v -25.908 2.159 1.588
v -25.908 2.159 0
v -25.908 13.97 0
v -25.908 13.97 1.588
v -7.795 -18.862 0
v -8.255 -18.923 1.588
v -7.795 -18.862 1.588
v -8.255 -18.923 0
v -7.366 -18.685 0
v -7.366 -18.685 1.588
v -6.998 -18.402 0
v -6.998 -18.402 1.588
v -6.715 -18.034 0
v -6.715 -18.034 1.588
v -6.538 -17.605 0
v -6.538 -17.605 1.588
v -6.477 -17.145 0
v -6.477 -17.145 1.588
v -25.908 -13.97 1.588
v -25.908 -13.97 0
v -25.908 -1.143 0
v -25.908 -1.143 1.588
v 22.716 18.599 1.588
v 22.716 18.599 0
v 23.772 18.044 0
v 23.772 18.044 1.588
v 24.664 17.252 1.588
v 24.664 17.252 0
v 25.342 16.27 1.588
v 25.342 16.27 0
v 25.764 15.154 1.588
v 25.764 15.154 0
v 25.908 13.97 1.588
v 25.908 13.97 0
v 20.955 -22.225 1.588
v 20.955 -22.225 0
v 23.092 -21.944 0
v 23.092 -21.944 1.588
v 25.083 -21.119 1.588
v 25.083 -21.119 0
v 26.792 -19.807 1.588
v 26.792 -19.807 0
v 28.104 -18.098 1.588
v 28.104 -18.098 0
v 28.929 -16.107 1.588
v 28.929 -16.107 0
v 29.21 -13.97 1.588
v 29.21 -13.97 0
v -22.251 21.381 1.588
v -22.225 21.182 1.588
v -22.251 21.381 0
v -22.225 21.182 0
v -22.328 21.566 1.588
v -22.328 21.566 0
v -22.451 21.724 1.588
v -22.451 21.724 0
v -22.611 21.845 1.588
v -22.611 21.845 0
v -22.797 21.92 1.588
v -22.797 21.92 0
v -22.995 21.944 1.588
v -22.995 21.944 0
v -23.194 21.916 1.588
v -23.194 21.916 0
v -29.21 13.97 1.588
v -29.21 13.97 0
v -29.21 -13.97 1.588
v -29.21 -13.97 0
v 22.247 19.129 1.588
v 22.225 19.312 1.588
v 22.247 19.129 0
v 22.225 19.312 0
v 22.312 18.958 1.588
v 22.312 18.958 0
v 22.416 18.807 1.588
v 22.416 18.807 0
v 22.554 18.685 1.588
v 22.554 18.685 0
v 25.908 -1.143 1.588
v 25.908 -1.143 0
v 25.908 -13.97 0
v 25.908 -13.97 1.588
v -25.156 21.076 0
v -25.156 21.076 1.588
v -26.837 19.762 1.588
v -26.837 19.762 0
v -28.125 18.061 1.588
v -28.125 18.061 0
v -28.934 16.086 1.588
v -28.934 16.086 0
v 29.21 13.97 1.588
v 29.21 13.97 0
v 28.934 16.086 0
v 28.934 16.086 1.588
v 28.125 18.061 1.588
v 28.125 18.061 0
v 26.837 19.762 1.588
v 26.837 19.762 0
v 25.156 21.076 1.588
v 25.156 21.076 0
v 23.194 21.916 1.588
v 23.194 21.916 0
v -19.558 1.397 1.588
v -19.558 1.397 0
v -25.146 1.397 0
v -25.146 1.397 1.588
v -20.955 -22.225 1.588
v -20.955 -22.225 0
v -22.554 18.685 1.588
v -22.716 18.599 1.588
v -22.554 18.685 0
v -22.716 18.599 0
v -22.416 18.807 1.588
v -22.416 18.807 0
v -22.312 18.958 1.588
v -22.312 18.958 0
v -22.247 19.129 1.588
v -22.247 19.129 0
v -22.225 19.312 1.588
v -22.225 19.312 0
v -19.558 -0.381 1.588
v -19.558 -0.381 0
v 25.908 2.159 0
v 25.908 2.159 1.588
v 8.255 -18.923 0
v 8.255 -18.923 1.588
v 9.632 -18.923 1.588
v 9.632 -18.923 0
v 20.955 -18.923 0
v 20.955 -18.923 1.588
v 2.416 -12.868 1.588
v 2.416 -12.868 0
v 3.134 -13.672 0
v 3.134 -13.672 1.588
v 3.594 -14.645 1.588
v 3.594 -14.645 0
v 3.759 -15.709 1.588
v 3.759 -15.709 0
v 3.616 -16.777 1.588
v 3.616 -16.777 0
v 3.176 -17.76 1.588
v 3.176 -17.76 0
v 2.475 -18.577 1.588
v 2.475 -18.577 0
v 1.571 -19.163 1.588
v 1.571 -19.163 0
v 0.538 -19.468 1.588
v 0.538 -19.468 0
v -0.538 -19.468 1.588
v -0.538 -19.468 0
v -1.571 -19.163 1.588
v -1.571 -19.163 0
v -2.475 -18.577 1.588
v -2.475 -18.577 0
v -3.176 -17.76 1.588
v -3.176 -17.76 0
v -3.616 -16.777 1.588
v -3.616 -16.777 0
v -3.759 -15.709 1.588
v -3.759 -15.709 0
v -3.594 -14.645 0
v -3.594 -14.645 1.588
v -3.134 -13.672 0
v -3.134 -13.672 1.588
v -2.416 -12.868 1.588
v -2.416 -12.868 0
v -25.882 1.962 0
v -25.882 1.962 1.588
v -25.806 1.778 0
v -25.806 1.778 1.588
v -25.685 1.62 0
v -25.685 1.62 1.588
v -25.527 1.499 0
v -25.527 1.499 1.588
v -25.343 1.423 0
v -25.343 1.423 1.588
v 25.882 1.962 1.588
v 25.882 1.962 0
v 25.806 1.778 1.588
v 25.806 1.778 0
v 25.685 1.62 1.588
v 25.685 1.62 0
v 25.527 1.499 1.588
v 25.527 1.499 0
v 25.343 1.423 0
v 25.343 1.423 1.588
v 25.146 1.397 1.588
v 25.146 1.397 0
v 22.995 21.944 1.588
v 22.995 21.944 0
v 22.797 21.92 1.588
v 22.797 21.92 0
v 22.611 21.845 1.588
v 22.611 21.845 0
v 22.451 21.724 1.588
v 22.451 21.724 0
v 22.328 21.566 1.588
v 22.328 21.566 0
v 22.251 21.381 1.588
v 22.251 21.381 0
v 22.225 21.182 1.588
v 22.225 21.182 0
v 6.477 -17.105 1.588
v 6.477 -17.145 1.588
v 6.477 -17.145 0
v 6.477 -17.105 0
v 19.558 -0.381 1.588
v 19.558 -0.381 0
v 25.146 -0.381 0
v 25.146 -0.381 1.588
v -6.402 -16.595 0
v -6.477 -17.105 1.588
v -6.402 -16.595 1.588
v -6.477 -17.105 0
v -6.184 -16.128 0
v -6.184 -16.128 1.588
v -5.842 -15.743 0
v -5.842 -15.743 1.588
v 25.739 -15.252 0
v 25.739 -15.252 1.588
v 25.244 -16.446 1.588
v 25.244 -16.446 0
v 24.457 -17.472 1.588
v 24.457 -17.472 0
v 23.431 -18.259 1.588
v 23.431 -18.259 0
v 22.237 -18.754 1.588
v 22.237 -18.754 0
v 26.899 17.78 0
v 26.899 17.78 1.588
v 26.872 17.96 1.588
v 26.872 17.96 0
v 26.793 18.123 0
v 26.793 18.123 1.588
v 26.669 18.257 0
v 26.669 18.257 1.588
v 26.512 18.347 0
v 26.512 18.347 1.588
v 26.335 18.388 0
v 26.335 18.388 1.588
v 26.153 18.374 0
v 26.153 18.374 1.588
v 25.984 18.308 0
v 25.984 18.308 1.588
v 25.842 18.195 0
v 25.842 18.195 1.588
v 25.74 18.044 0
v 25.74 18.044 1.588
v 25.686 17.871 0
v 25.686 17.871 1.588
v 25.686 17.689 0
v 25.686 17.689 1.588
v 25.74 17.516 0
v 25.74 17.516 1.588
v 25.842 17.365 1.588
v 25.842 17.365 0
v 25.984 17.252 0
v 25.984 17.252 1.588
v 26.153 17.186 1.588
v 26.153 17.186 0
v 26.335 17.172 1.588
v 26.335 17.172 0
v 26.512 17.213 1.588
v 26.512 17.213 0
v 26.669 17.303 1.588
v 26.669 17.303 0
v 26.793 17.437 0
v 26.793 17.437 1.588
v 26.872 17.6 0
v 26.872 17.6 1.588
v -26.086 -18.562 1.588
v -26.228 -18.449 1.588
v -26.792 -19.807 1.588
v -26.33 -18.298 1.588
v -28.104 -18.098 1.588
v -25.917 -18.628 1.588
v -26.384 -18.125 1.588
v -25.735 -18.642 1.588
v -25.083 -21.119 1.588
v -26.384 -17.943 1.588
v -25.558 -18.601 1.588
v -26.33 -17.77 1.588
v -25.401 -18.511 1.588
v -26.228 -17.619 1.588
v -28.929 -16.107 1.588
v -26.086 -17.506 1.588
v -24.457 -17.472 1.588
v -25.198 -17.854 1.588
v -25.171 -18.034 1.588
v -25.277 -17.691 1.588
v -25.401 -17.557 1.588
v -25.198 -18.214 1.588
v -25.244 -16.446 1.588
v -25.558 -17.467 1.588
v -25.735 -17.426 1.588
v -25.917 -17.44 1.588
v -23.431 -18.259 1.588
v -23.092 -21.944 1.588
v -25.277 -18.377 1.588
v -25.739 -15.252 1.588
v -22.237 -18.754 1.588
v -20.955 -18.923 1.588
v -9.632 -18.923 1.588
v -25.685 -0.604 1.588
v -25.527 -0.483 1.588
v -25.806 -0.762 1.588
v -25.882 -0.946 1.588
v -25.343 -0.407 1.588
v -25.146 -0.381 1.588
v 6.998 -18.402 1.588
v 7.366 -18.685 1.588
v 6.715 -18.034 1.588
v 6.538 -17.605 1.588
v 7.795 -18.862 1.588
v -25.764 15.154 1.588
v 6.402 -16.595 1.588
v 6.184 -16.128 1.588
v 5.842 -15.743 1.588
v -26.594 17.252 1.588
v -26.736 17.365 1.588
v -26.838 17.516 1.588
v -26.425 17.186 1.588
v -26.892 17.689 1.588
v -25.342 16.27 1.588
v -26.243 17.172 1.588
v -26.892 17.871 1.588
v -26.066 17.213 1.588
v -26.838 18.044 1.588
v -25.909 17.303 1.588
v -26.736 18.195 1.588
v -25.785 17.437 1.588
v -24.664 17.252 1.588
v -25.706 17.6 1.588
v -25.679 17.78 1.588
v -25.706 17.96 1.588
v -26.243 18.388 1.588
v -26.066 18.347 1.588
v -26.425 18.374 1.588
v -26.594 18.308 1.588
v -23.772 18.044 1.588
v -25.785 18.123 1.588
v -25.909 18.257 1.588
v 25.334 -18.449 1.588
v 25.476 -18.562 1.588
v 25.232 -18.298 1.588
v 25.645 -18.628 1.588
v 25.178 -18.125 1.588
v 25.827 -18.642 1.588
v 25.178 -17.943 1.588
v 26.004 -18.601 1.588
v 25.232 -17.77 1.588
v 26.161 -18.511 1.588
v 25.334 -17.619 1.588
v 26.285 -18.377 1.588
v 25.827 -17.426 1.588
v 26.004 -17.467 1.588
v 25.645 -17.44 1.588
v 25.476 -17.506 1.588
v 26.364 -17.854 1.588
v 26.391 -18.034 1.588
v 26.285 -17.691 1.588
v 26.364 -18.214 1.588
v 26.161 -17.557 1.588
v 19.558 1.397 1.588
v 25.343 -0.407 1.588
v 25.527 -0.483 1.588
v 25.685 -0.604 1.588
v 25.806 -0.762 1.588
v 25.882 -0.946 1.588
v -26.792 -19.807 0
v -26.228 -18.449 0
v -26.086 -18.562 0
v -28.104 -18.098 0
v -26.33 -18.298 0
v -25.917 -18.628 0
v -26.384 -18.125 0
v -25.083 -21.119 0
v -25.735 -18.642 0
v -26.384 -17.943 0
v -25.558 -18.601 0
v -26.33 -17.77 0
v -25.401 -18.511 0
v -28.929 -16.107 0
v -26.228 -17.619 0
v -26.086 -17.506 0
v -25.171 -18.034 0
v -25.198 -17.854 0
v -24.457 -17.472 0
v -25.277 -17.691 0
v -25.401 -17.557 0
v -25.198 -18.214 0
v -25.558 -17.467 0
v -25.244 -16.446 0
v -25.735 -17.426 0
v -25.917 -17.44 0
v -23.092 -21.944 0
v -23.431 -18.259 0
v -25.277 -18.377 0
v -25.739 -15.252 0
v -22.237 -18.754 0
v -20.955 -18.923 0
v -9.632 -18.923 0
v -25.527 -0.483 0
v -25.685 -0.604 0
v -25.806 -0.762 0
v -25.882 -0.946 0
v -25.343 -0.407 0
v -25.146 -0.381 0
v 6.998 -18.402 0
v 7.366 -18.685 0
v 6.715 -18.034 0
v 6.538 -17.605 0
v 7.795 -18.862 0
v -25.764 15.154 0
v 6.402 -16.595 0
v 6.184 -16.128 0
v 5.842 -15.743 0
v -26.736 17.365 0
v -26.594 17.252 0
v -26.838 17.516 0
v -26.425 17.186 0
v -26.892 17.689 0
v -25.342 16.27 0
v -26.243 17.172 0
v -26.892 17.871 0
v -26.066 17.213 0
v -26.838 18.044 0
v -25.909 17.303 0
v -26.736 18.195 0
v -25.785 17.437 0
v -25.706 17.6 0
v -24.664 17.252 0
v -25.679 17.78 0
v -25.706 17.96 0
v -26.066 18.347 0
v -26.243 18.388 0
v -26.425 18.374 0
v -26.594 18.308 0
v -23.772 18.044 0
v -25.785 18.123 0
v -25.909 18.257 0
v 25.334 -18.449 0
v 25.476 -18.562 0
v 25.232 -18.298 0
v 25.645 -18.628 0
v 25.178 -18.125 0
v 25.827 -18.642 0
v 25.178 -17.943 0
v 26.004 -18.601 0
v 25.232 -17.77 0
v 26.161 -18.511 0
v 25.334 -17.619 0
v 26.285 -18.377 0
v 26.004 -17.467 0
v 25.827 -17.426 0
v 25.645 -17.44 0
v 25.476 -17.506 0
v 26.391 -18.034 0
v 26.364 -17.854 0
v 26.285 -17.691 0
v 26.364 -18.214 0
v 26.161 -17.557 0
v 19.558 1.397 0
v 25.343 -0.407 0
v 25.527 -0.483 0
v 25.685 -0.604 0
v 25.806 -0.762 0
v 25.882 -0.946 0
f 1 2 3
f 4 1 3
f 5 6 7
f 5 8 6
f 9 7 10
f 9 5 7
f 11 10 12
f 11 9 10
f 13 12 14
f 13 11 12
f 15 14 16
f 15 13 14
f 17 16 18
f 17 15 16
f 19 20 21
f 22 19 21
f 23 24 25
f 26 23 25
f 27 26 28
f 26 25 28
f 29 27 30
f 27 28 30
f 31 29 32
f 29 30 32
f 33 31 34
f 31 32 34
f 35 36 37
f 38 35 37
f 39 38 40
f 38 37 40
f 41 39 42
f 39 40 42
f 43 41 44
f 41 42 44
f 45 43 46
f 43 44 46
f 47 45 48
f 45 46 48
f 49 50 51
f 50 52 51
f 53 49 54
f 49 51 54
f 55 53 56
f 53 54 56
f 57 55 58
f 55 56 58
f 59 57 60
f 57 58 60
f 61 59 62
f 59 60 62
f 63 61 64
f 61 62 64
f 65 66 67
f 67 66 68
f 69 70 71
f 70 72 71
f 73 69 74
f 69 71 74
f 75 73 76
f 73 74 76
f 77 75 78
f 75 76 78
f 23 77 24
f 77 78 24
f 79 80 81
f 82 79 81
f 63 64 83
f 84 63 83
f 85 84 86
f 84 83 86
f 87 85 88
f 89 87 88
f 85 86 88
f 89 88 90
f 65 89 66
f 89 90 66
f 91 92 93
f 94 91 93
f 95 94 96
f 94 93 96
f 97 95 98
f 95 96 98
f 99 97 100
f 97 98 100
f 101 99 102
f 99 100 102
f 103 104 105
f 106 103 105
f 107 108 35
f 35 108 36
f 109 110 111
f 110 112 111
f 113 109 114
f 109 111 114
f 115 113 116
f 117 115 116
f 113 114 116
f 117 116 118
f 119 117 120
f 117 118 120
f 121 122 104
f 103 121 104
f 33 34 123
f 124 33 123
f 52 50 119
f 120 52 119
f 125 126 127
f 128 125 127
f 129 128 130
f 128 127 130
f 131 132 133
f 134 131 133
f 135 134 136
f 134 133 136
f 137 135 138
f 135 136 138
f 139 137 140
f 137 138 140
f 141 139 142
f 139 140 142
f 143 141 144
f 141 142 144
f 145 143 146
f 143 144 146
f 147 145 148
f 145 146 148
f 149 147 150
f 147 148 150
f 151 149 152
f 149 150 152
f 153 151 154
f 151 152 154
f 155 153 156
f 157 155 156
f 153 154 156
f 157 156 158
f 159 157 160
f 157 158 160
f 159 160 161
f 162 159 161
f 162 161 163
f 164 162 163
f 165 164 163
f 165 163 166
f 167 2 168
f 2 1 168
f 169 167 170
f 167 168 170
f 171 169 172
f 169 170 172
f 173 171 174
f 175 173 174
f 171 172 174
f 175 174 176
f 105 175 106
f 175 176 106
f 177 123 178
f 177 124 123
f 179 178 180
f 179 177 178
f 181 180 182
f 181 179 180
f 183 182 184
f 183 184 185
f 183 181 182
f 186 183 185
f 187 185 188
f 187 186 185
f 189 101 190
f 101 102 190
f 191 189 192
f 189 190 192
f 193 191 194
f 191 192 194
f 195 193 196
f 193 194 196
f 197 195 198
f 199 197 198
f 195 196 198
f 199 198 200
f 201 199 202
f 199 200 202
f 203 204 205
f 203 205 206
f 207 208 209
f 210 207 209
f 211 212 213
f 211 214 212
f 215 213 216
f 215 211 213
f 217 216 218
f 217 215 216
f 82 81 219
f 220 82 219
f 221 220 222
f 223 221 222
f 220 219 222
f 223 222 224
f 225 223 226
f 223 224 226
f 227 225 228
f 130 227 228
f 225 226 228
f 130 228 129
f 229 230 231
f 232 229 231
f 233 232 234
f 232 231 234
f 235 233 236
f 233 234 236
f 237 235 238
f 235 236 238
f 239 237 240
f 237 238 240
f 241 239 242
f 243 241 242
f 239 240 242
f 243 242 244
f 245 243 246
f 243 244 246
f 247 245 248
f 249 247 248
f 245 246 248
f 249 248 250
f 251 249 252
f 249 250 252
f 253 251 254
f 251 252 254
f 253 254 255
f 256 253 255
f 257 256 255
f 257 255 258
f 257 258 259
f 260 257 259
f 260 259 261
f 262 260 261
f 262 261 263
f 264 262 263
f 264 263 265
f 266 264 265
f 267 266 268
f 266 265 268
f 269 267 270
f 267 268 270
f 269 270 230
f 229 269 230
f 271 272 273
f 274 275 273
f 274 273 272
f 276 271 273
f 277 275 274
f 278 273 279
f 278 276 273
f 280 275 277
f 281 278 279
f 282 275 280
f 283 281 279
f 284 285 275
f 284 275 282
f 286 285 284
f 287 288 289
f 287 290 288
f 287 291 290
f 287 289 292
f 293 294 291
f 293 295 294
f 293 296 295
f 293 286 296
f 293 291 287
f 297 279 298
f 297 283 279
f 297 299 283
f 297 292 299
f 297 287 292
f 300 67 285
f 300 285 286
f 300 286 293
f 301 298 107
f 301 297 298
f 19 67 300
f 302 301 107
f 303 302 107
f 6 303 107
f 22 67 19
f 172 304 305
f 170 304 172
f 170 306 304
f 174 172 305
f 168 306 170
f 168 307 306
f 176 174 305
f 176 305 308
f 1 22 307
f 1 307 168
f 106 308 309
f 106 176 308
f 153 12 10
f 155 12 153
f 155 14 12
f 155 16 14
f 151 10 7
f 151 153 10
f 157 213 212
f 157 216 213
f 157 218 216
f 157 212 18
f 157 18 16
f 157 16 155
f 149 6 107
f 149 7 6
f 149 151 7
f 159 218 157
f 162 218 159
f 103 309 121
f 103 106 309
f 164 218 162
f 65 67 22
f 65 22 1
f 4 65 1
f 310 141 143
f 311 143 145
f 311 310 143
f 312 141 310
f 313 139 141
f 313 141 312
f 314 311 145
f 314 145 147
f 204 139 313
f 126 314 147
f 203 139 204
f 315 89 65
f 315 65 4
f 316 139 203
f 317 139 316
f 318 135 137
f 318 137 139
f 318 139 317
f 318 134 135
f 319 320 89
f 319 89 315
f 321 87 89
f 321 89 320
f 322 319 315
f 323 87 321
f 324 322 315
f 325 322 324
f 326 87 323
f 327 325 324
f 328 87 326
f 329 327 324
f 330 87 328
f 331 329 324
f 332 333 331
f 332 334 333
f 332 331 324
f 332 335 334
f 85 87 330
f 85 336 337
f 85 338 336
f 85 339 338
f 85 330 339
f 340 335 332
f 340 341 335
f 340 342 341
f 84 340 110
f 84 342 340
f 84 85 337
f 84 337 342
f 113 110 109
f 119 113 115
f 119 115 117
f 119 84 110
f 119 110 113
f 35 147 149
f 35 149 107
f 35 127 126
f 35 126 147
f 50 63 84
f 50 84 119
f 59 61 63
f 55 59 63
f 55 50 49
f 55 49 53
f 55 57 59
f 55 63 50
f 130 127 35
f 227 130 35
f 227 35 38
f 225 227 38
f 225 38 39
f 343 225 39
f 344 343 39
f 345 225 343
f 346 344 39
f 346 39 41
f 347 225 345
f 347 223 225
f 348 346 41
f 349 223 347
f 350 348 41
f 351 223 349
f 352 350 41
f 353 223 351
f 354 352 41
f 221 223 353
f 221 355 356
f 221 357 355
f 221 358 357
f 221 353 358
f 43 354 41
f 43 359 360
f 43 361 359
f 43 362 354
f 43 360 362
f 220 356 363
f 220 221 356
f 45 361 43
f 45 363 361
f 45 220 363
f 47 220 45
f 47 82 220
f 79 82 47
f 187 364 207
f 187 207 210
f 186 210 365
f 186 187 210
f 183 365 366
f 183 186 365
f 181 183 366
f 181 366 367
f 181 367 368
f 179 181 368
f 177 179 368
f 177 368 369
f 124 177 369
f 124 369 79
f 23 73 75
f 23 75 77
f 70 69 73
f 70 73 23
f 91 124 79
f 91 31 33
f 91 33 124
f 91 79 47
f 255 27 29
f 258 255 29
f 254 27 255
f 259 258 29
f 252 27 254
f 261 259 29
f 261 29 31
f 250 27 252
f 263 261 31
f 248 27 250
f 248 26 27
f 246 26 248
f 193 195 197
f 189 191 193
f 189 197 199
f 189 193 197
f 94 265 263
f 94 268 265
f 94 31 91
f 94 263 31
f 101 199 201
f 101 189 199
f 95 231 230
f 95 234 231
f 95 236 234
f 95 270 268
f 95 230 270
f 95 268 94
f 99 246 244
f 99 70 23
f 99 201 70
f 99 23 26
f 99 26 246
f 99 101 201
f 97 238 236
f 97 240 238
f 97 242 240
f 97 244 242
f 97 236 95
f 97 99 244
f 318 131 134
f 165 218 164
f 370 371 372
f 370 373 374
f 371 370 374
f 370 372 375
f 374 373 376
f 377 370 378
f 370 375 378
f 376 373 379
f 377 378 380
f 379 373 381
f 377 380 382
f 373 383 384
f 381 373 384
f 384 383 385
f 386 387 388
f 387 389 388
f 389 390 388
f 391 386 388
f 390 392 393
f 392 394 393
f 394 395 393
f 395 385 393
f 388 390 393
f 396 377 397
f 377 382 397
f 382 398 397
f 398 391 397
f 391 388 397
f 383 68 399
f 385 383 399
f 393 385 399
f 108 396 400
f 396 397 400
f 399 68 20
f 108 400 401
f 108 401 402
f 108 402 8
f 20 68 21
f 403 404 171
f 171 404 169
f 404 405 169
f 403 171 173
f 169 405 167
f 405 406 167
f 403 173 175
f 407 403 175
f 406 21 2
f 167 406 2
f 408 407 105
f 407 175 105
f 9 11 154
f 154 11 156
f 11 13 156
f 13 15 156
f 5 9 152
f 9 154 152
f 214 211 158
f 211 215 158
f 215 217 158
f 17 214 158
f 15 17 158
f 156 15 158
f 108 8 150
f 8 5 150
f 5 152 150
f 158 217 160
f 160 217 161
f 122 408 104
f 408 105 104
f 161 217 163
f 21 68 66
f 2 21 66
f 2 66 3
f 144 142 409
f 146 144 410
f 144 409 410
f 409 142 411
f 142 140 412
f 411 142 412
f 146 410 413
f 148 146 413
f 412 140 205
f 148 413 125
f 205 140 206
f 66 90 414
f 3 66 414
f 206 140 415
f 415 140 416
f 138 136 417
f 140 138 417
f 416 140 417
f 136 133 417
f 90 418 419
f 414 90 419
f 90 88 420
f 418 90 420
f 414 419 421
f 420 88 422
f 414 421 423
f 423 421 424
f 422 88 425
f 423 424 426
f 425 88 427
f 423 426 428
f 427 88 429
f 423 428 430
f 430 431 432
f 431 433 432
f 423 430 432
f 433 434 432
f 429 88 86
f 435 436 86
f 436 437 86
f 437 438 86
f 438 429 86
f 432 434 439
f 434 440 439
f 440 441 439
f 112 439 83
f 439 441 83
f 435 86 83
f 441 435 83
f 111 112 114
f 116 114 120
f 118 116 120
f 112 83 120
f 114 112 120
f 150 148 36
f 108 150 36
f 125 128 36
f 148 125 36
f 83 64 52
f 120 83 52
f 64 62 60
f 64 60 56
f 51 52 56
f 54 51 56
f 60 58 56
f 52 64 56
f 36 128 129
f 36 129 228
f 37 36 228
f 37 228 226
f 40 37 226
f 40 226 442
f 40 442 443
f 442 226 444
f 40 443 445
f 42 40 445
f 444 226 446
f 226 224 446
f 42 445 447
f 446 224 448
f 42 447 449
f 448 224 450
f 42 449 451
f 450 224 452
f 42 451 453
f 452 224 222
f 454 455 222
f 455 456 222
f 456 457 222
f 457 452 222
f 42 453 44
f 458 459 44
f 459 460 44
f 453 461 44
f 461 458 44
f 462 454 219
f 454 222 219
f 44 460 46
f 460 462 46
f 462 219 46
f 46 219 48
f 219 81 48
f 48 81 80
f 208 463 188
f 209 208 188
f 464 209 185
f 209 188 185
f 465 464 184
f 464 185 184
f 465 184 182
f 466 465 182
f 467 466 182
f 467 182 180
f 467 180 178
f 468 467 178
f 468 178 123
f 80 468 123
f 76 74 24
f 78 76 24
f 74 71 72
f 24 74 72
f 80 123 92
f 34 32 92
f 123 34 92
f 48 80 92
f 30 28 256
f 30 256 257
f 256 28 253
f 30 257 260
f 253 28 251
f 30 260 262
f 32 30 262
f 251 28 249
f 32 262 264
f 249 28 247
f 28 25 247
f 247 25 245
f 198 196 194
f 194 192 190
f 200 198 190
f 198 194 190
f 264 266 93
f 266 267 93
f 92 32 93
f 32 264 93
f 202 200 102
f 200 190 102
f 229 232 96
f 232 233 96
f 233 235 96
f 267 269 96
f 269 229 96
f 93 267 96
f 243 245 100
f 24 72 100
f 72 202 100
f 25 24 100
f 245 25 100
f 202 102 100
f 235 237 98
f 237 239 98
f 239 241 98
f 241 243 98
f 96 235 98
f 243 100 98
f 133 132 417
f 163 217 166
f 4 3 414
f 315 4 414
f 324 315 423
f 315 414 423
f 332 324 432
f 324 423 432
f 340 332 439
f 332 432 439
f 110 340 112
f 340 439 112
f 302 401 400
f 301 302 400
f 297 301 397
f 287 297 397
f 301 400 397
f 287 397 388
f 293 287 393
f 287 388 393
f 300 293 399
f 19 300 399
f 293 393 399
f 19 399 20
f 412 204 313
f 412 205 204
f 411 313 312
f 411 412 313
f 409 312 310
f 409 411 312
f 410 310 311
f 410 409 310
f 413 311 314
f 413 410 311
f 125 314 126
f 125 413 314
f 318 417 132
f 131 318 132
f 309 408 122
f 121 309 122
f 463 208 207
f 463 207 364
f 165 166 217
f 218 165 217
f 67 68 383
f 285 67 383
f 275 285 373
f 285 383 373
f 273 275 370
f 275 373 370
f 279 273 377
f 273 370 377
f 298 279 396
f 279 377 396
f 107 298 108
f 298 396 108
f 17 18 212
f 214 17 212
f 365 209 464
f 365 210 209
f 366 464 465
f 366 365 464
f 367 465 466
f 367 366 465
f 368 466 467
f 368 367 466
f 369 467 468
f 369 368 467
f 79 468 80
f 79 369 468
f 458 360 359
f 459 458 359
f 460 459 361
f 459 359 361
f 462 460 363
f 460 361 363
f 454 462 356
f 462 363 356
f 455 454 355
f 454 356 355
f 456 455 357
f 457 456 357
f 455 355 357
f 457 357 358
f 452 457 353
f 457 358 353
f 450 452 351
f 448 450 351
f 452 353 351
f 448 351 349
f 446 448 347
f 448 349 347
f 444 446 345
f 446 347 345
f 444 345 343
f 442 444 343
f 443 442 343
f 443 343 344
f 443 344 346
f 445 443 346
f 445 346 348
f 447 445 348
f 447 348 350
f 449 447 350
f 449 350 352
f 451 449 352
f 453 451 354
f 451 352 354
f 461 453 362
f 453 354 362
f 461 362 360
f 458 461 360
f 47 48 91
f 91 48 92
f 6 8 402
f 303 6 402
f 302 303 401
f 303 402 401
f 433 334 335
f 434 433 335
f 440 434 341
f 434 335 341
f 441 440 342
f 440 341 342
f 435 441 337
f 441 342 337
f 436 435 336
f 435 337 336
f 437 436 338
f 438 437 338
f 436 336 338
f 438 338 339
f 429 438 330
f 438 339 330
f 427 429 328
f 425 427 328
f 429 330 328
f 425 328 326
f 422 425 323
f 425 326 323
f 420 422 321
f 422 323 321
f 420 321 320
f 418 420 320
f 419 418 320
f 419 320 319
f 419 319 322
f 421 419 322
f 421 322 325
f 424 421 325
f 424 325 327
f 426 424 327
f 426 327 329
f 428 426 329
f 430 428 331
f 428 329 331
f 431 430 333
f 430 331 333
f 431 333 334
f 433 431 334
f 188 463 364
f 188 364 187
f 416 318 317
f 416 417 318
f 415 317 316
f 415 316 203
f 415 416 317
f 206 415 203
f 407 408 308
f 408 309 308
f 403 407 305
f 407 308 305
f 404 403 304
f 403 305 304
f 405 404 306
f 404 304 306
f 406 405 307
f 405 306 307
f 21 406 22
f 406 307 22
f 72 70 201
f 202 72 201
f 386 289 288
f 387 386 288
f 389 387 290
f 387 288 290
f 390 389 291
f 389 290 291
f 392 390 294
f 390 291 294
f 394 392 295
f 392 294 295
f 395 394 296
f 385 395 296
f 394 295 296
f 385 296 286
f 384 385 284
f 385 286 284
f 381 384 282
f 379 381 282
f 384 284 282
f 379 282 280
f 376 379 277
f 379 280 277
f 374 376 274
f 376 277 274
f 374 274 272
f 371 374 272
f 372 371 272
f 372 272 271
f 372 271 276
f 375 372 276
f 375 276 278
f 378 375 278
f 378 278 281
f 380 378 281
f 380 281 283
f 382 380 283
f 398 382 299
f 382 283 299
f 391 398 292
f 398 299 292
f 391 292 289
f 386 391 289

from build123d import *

# Parameters (mm, degrees)
SKETCH1_W           = 6.35
SKETCH1_H           = 1.778
BOSS_EXTRUDE1_DEPTH = 1.5875
CUT_EXTRUDE1_REACH  = 38.738
SKETCH2_W           = 3.155094666
SKETCH2_H           = 2.647438771
FILLET1_R           = 1.778
FILLET2_R           = 0.762
FILLET3_R           = 0.762
SKETCH3_R           = 0.6096
CUT_EXTRUDE2_DEPTH  = 1.5875


with BuildPart() as part:
    # Sketch1 → Boss-Extrude1 (new body)
    # profile 1 of 3: a face of its own
    with BuildSketch(Plane.XY):
        with BuildLine():
            ThreePointArc((29.21, 13.97), (26.792166479, 19.807166479), (20.955, 22.225))
            Line((20.955, 22.225), (-20.955, 22.225))
            ThreePointArc((-20.955, 22.225), (-26.792166479, 19.807166479), (-29.21, 13.97))
            Line((-29.21, 13.97), (-29.21, -13.97))
            ThreePointArc((-29.21, -13.97), (-26.792166479, -19.807166479), (-20.955, -22.225))
            Line((-20.955, -22.225), (20.955, -22.225))
            ThreePointArc((20.955, -22.225), (26.792166479, -19.807166479), (29.21, -13.97))
            Line((29.21, -13.97), (29.21, 13.97))
        make_face()
        with BuildLine():
            Line((-9.632094666, -18.923), (-20.955, -18.923))
            ThreePointArc((-20.955, -18.923), (-24.457299887, -17.472299887), (-25.908, -13.97))
            Line((-25.908, -13.97), (-25.908, -1.27))
            Line((-25.908, -1.27), (-25.908, -0.381))
            Line((-25.908, -0.381), (-25.908, 0))
            Line((-25.908, 0), (-25.908, 1.397))
            Line((-25.908, 1.397), (-25.908, 13.97))
            ThreePointArc((-25.908, 13.97), (-24.457299887, 17.472299887), (-20.955, 18.923))
            Line((-20.955, 18.923), (20.955, 18.923))
            ThreePointArc((20.955, 18.923), (24.457299887, 17.472299887), (25.908, 13.97))
            Line((25.908, 13.97), (25.908, 1.397))
            Line((25.908, 1.397), (25.908, -0.381))
            Line((25.908, -0.381), (25.908, -13.97))
            ThreePointArc((25.908, -13.97), (24.457299887, -17.472299887), (20.955, -18.923))
            Line((20.955, -18.923), (9.632094666, -18.923))
            Line((9.632094666, -18.923), (2.416367182, -12.868285729))
            ThreePointArc((2.416367182, -12.868285729), (0, -19.5072), (-2.416367182, -12.868285729))
            Line((-2.416367182, -12.868285729), (-9.632094666, -18.923))
        make_face(mode=Mode.SUBTRACT)
    # profile 2 of 3: a face of its own
    with BuildSketch(Plane.XY):
        with Locations((22.733, 0.508)):
            Rectangle(SKETCH1_W, SKETCH1_H)
    # profile 3 of 3: a face of its own
    with BuildSketch(Plane.XY):
        Polygon((-25.908, 0), (-25.908, -0.381), (-19.558, -0.381), (-19.558, 1.397), (-25.908, 1.397), align=None)
    extrude(amount=BOSS_EXTRUDE1_DEPTH)

    # Sketch2 → Cut-Extrude1 (cut, up to next)
    with BuildSketch(Plane.XY.offset(1.5875), mode=Mode.PRIVATE) as cut_extrude1_sk1:
        with Locations((-8.054547333, -17.599280615)):
            Rectangle(SKETCH2_W, SKETCH2_H)
    cut_extrude1_tool1 = extrude(cut_extrude1_sk1.sketch, amount=-CUT_EXTRUDE1_REACH, mode=Mode.PRIVATE) & part.part
    # Sketch2 → Cut-Extrude1 (cut, up to next)
    with BuildSketch(Plane.XY.offset(1.5875), mode=Mode.PRIVATE) as cut_extrude1_sk2:
        with Locations((8.054547333, -17.599280615)):
            Rectangle(SKETCH2_W, SKETCH2_H)
    cut_extrude1_tool2 = extrude(cut_extrude1_sk2.sketch, amount=-CUT_EXTRUDE1_REACH, mode=Mode.PRIVATE) & part.part
    # Sketch2 → Cut-Extrude1 (cut, up to next)
    with BuildSketch(Plane.XY.offset(1.5875), mode=Mode.PRIVATE) as cut_extrude1_sk3:
        with BuildLine():
            Line((-20.955, 18.923), (20.955, 18.923))
            ThreePointArc((20.955, 18.923), (21.595374802, 18.881428419), (22.225, 18.757411514))
            Line((22.225, 18.757411514), (22.225, 22.225))
            Line((22.225, 22.225), (-22.225, 22.225))
            Line((-22.225, 22.225), (-22.225, 18.757411514))
            ThreePointArc((-22.225, 18.757411514), (-21.595374802, 18.881428419), (-20.955, 18.923))
        make_face()
    cut_extrude1_tool3 = extrude(cut_extrude1_sk3.sketch, amount=-CUT_EXTRUDE1_REACH, mode=Mode.PRIVATE) & part.part
    add(cut_extrude1_tool1.solids().sort_by_distance((-8.054547, -17.599281, 1.5875))[0], mode=Mode.SUBTRACT)
    add(cut_extrude1_tool2.solids().sort_by_distance((8.054547, -17.599281, 1.5875))[0], mode=Mode.SUBTRACT)
    add(cut_extrude1_tool3.solids().sort_by_distance((0, 20.572388, 1.5875))[0], mode=Mode.SUBTRACT)

    # Fillet1
    fillet1_edges = [part.edges().sort_by_distance(p)[0] for p in [
        (-6.477, -18.923, 0.79375),
        (-6.477, -16.275561229, 0.79375),
        (6.477, -18.923, 0.79375),
        (6.477, -16.275561229, 0.79375),
    ]]
    fillet(fillet1_edges, radius=FILLET1_R)

    # Fillet2
    fillet2_edges = [part.edges().sort_by_distance(p)[0] for p in [
        (-22.225, 22.126722687, 0.79375),
        (-22.225, 18.757411514, 0.79375),
        (22.225, 18.757411514, 0.79375),
        (22.225, 22.126722687, 0.79375),
    ]]
    fillet(fillet2_edges, radius=FILLET2_R)

    # Fillet3
    fillet3_edges = [part.edges().sort_by_distance(p)[0] for p in [
        (25.908, -0.381, 0.79375),
        (25.908, 1.397, 0.79375),
        (-25.908, 1.397, 0.79375),
        (-25.908, -0.381, 0.79375),
    ]]
    fillet(fillet3_edges, radius=FILLET3_R)

    # Sketch3 → Cut-Extrude2 (cut)
    with BuildSketch(Plane.XY.offset(1.5875)):
        with Locations((-26.289, 17.78)):
            Circle(SKETCH3_R)
        with Locations((-25.781, -18.034)):
            Circle(SKETCH3_R)
        with Locations((26.289, 17.78)):
            Circle(SKETCH3_R)
        with Locations((25.781, -18.034)):
            Circle(SKETCH3_R)
    extrude(amount=-CUT_EXTRUDE2_DEPTH, mode=Mode.SUBTRACT)


solid = part.part
